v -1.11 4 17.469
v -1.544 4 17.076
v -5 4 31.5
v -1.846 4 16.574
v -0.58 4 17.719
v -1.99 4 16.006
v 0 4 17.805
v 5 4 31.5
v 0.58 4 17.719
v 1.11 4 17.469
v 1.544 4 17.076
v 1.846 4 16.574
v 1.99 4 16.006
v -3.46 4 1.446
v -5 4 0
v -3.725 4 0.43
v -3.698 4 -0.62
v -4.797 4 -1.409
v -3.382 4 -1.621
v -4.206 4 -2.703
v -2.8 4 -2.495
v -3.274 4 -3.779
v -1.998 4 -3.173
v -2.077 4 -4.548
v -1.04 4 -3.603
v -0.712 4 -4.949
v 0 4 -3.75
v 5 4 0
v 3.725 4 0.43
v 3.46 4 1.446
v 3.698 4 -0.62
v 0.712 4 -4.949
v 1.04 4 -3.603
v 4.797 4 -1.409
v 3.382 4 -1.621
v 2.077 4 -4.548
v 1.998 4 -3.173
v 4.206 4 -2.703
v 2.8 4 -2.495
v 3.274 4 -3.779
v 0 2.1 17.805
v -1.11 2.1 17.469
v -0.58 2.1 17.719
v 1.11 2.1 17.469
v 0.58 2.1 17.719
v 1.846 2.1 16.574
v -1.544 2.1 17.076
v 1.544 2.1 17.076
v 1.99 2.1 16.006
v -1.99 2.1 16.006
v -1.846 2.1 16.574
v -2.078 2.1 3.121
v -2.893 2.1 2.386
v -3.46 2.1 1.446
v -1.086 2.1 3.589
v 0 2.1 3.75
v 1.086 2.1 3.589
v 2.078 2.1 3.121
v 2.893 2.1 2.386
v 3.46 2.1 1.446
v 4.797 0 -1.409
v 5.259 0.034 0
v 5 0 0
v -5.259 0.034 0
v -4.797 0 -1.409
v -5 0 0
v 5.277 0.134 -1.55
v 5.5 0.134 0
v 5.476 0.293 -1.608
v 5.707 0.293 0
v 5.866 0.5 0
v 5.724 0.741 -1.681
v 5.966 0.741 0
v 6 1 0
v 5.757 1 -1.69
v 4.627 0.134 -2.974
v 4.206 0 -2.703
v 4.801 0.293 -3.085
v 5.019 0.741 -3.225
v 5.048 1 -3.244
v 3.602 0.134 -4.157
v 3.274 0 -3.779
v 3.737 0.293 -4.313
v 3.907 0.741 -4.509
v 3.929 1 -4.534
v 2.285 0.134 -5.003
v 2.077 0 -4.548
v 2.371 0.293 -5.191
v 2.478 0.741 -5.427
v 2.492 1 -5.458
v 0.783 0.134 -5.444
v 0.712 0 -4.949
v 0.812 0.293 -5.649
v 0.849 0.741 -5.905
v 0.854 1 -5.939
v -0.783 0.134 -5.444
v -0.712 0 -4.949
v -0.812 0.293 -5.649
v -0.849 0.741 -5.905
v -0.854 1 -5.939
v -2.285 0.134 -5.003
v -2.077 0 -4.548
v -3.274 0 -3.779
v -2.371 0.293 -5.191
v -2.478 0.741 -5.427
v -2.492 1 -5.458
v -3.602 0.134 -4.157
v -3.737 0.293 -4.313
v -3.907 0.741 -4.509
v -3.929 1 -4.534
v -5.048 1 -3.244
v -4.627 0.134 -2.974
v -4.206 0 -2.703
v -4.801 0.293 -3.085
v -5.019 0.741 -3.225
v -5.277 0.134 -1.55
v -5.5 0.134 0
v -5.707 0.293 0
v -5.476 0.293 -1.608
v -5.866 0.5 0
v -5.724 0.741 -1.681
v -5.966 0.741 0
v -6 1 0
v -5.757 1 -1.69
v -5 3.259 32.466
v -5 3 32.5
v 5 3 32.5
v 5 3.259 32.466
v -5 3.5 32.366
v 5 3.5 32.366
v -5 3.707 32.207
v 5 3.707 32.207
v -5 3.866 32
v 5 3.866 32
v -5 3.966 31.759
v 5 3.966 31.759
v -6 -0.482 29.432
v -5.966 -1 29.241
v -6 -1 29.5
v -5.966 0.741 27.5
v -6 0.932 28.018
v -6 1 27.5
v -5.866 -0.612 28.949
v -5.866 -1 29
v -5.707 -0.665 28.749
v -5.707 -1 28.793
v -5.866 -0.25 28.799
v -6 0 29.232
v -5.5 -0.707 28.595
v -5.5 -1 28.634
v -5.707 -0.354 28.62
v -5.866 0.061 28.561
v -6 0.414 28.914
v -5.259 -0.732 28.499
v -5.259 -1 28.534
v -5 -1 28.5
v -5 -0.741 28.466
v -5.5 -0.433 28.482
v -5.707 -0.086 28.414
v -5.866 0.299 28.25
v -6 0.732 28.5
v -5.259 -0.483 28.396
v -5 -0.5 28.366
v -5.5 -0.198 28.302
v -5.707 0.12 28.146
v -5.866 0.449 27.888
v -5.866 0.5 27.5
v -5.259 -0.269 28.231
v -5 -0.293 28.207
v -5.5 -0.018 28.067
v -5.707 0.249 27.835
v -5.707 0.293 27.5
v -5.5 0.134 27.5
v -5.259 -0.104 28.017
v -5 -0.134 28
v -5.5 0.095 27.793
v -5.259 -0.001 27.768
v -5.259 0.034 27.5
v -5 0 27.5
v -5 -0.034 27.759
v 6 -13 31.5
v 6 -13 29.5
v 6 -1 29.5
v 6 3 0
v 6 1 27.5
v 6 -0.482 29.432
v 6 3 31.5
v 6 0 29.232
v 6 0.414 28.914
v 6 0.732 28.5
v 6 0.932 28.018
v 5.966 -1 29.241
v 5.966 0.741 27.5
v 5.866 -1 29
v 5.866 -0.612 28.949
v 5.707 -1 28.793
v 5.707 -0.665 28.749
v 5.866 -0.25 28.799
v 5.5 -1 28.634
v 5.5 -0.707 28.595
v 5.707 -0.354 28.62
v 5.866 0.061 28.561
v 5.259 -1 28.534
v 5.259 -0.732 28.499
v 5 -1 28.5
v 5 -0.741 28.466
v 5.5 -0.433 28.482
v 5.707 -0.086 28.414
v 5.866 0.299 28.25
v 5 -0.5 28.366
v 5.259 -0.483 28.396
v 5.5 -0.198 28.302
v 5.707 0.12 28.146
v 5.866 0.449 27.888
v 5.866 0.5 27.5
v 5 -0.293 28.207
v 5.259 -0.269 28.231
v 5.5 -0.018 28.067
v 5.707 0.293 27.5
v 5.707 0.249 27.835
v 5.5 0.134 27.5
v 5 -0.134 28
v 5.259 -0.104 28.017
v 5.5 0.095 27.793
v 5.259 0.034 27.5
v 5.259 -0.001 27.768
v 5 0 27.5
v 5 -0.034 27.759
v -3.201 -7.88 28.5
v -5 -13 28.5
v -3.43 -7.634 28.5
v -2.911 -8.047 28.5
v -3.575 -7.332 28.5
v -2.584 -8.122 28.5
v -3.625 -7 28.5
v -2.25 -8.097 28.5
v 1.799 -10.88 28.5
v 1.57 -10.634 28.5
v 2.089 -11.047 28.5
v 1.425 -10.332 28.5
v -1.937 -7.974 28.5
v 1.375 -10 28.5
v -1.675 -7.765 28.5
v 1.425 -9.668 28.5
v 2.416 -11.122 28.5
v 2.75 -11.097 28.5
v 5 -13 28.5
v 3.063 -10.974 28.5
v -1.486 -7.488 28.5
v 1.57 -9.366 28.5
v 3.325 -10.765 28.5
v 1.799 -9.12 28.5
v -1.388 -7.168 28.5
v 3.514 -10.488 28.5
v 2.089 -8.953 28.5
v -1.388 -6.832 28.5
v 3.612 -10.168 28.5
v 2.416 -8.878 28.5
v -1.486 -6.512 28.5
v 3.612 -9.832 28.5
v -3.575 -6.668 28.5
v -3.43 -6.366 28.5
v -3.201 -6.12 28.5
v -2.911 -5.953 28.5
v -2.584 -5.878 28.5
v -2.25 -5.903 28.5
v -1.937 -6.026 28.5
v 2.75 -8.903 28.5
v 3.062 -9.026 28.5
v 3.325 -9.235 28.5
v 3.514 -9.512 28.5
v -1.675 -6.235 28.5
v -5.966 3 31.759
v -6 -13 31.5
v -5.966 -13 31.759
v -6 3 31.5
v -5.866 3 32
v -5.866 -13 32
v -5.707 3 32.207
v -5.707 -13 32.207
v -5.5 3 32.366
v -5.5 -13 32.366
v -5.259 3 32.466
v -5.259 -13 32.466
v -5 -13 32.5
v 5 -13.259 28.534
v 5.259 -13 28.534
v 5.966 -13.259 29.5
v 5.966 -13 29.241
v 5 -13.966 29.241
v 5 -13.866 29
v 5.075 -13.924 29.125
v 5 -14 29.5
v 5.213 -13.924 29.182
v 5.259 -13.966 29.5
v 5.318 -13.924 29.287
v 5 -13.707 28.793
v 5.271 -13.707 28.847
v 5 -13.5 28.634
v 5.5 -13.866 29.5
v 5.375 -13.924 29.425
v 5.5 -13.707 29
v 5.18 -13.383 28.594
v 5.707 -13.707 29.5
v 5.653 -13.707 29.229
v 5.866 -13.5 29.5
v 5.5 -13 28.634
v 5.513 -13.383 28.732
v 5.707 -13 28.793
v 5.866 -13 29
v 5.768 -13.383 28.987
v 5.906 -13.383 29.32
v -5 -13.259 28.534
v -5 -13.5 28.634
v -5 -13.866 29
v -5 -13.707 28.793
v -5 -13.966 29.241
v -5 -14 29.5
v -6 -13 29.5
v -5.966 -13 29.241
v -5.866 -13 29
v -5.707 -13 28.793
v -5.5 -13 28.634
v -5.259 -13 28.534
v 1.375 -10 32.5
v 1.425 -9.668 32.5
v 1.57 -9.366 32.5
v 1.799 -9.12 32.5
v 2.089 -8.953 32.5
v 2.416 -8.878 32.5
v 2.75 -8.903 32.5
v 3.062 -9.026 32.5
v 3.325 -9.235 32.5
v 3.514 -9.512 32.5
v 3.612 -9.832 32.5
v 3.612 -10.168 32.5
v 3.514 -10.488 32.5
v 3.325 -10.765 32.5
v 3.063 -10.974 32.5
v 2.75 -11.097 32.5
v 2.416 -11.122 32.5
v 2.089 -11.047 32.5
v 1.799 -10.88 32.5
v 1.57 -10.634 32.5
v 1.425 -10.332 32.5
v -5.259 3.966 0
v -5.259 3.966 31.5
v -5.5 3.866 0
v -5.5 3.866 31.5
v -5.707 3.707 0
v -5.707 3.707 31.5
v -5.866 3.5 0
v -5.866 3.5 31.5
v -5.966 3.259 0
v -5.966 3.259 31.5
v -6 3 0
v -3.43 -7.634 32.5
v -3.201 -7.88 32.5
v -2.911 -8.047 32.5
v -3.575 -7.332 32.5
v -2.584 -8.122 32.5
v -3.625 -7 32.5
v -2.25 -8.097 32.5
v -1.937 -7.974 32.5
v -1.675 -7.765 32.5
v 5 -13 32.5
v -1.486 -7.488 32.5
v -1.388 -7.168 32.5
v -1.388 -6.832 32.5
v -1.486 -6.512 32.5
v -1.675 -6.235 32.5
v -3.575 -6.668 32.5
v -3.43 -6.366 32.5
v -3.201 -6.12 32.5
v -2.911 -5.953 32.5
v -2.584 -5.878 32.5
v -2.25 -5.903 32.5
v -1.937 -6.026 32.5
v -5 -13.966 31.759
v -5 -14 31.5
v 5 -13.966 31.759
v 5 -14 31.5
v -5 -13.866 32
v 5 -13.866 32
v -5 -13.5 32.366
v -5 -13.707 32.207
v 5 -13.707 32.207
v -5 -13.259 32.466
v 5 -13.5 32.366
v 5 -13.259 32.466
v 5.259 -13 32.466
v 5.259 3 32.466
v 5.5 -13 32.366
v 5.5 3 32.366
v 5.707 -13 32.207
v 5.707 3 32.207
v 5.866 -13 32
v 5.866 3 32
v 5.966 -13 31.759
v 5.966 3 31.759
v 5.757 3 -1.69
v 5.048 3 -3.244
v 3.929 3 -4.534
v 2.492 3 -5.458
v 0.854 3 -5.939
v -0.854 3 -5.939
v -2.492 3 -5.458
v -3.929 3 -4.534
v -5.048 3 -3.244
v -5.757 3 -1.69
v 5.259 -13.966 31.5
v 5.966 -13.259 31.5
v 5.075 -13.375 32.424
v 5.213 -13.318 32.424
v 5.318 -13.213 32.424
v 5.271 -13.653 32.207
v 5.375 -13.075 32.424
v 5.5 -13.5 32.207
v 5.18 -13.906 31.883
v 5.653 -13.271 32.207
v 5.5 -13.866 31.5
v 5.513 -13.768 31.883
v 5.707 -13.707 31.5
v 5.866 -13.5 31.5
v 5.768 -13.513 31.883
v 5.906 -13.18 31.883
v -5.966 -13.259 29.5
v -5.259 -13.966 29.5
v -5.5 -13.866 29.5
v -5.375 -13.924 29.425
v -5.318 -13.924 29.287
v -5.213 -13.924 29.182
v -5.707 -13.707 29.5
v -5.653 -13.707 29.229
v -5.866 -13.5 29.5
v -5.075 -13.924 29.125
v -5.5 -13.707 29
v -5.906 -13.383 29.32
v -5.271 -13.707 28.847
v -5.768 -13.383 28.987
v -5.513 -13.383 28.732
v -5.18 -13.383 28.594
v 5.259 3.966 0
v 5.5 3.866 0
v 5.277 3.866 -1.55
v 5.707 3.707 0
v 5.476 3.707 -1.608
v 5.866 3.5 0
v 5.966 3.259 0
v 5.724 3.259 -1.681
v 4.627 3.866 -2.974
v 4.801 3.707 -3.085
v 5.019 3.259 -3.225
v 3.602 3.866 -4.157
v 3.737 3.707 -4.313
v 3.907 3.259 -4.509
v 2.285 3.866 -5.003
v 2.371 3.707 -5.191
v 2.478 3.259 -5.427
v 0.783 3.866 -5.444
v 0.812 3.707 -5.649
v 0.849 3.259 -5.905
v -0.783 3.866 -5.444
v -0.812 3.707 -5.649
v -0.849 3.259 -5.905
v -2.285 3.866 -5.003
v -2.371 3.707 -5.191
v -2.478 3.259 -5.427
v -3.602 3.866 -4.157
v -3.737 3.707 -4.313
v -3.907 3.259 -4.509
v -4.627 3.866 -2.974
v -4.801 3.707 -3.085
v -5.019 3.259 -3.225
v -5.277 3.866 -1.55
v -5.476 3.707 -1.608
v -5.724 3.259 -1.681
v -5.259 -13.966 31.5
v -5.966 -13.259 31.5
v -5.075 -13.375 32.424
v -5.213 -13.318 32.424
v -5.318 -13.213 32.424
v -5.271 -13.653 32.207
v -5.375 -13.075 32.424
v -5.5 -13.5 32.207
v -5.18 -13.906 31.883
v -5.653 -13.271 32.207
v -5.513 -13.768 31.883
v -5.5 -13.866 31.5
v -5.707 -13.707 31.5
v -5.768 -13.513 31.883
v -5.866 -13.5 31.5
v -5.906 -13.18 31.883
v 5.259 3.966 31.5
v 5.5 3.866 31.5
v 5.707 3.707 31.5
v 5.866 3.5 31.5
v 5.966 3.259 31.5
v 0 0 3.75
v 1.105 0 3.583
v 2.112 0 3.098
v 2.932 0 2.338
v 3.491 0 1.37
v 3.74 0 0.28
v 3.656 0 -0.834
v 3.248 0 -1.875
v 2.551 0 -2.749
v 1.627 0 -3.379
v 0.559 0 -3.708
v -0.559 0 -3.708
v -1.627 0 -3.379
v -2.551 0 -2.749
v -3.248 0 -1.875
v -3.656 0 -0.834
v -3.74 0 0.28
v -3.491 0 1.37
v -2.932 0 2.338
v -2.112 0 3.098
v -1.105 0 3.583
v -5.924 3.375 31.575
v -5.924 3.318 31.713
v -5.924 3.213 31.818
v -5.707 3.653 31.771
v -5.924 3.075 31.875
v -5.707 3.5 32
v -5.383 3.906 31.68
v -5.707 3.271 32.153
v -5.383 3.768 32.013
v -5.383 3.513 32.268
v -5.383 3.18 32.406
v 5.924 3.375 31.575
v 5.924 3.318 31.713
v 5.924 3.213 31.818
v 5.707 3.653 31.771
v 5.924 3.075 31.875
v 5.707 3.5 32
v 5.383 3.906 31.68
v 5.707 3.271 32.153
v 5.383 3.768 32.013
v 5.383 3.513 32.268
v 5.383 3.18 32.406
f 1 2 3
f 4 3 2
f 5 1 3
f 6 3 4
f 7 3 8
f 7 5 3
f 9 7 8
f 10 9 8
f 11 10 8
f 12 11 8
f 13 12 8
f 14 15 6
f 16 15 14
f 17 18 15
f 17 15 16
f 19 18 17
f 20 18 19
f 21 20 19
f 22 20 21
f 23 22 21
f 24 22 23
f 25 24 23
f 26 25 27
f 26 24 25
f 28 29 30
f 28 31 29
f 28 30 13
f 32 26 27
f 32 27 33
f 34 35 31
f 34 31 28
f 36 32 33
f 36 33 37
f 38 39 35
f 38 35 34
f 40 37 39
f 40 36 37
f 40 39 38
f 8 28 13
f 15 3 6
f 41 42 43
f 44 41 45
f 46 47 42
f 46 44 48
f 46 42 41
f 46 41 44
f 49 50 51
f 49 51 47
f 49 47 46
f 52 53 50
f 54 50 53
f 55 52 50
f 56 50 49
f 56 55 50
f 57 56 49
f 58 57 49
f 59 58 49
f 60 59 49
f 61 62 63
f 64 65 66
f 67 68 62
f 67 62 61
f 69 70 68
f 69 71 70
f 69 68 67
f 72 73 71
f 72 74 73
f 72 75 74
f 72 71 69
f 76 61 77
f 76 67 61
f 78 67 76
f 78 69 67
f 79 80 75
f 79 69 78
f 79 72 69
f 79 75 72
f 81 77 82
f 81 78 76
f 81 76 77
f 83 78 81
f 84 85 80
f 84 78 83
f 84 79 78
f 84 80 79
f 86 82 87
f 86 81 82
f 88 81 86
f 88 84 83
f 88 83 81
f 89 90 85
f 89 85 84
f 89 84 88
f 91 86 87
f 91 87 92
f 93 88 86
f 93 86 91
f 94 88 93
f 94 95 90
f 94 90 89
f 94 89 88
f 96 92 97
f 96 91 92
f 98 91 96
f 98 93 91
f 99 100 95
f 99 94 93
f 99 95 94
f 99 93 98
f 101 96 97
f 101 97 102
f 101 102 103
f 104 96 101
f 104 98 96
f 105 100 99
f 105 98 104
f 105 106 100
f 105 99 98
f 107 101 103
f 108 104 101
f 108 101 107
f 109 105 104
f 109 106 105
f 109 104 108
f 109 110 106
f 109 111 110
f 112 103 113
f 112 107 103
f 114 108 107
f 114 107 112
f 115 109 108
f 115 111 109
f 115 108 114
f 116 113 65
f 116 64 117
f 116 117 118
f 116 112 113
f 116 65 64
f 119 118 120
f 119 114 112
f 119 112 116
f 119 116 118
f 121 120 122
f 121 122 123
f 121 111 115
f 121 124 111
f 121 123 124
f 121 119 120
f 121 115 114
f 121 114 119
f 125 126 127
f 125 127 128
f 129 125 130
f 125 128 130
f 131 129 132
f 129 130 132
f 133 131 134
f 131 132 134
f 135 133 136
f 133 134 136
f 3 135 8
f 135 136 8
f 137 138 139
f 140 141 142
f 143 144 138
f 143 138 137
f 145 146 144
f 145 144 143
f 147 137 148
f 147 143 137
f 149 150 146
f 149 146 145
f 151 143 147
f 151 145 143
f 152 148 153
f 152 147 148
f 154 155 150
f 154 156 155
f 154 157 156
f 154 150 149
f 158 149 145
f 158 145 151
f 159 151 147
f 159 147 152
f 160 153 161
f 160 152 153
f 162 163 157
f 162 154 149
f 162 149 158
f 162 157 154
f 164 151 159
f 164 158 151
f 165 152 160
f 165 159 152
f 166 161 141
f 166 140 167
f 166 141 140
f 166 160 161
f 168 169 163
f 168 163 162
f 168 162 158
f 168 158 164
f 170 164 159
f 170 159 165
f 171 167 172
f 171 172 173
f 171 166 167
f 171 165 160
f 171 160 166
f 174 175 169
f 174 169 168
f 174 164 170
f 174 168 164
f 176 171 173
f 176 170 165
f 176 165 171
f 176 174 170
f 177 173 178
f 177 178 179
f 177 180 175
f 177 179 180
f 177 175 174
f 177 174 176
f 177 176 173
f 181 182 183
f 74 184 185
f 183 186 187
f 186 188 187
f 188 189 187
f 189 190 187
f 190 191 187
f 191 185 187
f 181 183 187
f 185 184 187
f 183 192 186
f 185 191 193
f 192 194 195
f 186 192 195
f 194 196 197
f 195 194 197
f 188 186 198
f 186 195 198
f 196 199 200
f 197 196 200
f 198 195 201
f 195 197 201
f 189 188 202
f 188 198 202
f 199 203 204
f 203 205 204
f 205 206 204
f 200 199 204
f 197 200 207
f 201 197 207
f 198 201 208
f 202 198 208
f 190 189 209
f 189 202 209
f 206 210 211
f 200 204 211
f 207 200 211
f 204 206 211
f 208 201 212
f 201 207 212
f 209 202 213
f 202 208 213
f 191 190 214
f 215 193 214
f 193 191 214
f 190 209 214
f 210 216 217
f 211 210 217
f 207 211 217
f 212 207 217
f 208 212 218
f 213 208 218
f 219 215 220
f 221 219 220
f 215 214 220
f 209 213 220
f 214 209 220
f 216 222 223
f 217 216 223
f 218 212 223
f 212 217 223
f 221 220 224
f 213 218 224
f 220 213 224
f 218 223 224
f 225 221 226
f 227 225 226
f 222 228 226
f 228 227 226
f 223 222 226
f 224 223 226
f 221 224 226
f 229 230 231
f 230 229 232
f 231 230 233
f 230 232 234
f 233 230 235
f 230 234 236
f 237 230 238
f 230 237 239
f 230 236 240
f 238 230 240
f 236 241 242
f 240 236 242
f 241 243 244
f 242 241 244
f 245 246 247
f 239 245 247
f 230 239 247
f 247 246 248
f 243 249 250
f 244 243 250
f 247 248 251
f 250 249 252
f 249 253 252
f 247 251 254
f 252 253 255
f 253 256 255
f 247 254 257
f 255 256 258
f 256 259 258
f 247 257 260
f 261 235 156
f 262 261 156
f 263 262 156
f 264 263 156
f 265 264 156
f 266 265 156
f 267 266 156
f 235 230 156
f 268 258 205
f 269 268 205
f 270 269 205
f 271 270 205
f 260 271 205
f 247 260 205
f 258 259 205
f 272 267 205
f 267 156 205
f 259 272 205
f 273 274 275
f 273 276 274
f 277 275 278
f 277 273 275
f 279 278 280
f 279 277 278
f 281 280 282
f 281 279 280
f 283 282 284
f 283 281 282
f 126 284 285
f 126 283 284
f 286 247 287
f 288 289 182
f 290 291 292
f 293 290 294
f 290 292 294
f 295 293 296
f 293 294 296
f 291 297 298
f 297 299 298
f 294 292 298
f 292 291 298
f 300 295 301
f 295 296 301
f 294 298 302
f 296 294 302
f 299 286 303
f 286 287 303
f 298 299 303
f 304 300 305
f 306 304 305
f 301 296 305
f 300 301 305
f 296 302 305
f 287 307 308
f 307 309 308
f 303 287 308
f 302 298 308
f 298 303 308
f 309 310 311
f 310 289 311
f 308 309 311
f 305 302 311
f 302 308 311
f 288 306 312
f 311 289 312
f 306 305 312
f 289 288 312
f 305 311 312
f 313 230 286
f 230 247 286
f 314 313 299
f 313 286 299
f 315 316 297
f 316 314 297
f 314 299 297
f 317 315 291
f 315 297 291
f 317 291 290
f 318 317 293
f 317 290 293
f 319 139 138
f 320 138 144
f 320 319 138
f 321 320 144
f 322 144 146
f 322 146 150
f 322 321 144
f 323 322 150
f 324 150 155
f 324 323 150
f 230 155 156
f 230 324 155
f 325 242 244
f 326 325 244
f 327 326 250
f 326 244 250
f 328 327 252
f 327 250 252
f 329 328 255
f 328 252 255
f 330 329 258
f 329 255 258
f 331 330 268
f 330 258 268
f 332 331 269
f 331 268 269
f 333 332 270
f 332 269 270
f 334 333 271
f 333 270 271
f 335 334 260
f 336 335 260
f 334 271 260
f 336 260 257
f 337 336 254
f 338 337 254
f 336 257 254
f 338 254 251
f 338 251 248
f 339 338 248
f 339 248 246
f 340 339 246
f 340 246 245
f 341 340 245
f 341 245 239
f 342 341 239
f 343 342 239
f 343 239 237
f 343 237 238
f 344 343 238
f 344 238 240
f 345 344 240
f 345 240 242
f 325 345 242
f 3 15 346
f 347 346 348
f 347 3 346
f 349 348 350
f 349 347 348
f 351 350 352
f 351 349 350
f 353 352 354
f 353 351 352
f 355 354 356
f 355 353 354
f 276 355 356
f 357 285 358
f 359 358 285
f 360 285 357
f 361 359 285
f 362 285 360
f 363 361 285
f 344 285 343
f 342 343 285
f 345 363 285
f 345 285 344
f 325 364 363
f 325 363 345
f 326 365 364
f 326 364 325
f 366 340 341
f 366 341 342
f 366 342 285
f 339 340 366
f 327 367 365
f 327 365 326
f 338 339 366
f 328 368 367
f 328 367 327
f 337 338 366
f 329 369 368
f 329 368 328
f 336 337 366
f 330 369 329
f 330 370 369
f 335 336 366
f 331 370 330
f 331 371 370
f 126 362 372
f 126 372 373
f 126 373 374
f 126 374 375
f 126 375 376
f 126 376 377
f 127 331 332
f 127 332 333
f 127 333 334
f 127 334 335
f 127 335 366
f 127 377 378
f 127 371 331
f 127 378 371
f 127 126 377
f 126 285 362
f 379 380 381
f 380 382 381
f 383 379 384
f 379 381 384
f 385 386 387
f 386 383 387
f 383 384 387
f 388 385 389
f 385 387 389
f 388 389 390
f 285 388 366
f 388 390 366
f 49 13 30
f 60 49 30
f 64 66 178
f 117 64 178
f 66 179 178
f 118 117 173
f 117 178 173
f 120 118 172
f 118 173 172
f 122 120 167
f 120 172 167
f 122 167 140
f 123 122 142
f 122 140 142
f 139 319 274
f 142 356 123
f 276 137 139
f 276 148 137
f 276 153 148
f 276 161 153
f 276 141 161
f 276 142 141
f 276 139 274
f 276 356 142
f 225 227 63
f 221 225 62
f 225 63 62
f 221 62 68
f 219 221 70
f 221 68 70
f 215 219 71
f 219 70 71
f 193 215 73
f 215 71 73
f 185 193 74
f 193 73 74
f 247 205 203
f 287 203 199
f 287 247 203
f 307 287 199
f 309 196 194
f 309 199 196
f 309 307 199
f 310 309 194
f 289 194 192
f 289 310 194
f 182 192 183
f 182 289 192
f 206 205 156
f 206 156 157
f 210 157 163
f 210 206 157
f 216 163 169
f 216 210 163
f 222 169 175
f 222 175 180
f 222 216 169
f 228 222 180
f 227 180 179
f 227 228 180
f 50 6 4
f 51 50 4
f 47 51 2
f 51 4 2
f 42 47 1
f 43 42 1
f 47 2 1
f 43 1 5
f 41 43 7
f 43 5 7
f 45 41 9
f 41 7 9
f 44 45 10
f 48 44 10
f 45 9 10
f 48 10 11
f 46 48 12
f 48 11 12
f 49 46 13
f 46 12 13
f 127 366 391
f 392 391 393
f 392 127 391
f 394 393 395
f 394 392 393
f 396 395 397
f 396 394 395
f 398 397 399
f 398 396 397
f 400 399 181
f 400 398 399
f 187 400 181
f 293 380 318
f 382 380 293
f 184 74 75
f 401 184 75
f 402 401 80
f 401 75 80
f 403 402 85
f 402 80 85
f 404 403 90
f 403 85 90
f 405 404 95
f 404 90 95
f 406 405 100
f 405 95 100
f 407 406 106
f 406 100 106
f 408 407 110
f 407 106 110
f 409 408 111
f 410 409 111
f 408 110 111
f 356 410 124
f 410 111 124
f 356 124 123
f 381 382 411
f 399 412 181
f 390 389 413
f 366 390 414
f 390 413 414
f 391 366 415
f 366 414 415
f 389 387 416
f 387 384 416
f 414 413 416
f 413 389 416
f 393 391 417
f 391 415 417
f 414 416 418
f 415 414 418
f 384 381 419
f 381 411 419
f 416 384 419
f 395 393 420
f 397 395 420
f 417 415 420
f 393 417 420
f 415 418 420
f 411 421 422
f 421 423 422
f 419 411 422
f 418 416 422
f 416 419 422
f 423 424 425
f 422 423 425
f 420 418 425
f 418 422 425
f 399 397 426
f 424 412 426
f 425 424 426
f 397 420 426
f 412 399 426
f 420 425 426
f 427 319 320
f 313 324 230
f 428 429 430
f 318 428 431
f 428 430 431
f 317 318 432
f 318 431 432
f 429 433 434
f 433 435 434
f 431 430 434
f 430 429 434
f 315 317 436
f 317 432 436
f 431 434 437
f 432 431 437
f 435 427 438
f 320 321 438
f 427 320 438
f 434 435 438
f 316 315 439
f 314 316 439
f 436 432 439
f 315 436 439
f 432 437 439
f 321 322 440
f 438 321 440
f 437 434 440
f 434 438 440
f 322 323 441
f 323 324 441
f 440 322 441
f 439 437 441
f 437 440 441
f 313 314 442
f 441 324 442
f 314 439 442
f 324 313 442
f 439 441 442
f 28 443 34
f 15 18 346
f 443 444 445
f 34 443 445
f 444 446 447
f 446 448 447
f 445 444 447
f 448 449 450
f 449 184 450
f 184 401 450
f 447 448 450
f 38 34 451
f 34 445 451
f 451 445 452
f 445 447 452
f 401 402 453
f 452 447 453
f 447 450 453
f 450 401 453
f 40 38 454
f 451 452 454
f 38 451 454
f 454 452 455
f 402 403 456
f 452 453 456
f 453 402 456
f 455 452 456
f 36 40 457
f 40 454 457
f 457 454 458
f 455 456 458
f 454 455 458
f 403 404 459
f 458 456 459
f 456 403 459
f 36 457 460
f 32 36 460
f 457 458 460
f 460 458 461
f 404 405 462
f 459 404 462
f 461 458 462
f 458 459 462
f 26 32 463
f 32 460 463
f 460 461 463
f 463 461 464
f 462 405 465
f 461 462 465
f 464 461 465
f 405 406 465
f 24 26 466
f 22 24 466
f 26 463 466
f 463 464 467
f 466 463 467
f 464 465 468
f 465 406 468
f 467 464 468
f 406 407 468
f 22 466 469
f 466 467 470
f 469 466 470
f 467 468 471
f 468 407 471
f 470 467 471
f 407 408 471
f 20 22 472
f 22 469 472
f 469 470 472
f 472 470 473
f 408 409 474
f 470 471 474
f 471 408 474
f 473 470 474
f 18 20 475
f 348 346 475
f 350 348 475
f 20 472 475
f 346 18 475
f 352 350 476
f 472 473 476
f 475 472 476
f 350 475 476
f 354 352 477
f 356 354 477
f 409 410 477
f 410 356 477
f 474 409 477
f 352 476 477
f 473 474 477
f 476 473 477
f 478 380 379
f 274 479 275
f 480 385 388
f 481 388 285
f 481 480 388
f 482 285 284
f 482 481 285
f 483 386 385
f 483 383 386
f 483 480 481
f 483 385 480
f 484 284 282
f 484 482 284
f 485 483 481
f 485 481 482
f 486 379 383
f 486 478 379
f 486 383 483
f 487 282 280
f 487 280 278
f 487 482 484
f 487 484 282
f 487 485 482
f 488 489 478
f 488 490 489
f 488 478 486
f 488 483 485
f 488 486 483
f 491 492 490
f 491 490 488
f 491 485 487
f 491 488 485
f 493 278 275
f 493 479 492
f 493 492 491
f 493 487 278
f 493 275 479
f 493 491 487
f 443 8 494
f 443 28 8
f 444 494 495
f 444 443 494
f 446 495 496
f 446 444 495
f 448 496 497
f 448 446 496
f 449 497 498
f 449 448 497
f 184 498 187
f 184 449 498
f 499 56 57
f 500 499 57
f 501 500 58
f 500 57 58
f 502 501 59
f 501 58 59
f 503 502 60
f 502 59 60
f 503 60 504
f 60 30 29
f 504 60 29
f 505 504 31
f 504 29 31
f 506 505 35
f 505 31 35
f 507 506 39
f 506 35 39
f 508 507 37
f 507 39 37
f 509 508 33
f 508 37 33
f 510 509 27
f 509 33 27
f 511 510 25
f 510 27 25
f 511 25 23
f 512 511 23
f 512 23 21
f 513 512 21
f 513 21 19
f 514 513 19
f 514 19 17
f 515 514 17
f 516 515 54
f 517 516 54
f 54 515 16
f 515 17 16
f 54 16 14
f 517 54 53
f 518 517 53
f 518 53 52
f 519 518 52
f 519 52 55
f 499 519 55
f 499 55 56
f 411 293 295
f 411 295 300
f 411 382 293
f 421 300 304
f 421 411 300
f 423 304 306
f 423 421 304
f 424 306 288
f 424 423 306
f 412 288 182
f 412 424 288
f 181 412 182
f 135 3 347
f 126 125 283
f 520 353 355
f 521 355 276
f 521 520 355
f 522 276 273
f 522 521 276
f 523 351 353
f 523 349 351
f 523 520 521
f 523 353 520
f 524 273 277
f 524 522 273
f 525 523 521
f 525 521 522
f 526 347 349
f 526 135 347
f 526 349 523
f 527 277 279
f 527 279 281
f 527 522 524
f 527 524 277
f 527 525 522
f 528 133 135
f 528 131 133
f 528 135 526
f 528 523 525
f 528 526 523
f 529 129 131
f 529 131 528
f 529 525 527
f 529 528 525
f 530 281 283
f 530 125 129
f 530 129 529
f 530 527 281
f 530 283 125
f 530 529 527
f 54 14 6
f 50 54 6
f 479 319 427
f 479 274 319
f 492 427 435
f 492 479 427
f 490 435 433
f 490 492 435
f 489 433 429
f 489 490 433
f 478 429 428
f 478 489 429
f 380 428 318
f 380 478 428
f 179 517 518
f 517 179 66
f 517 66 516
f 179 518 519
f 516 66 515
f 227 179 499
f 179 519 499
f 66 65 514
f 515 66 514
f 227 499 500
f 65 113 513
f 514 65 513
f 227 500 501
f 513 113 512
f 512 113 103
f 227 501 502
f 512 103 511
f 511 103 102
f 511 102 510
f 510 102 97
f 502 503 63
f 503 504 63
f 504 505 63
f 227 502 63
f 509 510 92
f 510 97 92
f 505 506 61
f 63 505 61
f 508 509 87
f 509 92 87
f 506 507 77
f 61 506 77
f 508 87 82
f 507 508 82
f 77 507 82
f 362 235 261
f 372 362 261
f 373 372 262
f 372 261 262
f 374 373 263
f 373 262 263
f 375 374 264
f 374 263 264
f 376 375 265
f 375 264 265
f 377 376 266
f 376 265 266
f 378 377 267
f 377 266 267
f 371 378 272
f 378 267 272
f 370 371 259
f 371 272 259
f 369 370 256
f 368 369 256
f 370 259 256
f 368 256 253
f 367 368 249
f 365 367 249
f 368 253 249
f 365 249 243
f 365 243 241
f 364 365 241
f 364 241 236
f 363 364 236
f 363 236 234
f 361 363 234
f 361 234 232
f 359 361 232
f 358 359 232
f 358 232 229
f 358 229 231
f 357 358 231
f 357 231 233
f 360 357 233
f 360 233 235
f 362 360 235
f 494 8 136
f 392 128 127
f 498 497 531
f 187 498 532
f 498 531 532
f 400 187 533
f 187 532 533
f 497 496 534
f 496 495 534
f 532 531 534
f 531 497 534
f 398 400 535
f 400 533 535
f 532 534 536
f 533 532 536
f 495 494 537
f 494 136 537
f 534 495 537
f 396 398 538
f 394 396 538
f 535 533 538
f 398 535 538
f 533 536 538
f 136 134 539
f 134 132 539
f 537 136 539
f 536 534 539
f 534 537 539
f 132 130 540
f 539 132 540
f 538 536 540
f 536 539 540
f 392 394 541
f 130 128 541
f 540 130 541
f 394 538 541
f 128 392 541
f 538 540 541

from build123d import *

# Parameters (mm, degrees)
YAW_ARM_BASE_DEPTH           = 4
YAW_ARM_MOUNTING_HOLE_REACH  = 35.29
SKETCH2_R                    = 3.75
YAW_ARM_SLOT_DEPTH           = 1.9
SKETCH5_W                    = 12
SKETCH5_H                    = 4
MOUNTING_BRACKET_DEPTH       = 14
BRACKET_MOUNTING_HOLES_REACH = 39.713
SKETCH8_R                    = 1.125
F_1MM_FILLETS_R              = 1


with BuildPart() as part:
    # Sketch1 → Yaw Arm Base (new body)
    with BuildSketch(Plane(origin=(0, 0, 0), x_dir=(1, 0, 0), z_dir=(0, 1, 0))):
        with BuildLine():
            Line((-6, 0), (-6, -32.5))
            Line((-6, -32.5), (6, -32.5))
            Line((6, -32.5), (6, 0))
            ThreePointArc((6, 0), (0, 6), (-6, 0))
        make_face()
    extrude(amount=YAW_ARM_BASE_DEPTH)

    # Sketch2 → Yaw Arm Mounting Hole (cut, up to next)
    with BuildSketch(Plane(origin=(0, 4, 0), x_dir=(1, 0, 0), z_dir=(0, 1, 0)), mode=Mode.PRIVATE) as yaw_arm_mounting_hole_sk1:
        with Locations(Location((0, 0, 0), (0, 0, 270))):
            Circle(SKETCH2_R)
    yaw_arm_mounting_hole_tool1 = extrude(yaw_arm_mounting_hole_sk1.sketch, amount=-YAW_ARM_MOUNTING_HOLE_REACH, mode=Mode.PRIVATE) & part.part
    add(yaw_arm_mounting_hole_tool1.solids().sort_by_distance((0, 4, 0))[0], mode=Mode.SUBTRACT)

    # Sketch4 → Yaw Arm Slot (cut)
    with BuildSketch(Plane(origin=(0, 4, 0), x_dir=(1, 0, 0), z_dir=(0, 1, 0))):
        with BuildLine():
            Line((-3.46, -1.445994467), (-1.989882432, -16.005994467))
            ThreePointArc((-1.989882432, -16.005994467), (0, -17.805076808), (1.989882432, -16.005994467))
            Line((1.989882432, -16.005994467), (3.46, -1.445994467))
            ThreePointArc((3.46, -1.445994467), (0, -3.75), (-3.46, -1.445994467))
        make_face()
    extrude(amount=-YAW_ARM_SLOT_DEPTH, mode=Mode.SUBTRACT)

    # Sketch5 → Mounting Bracket (add)
    with BuildSketch(Plane.XZ):
        with Locations((0, 30.5)):
            Rectangle(SKETCH5_W, SKETCH5_H)
    extrude(amount=MOUNTING_BRACKET_DEPTH)

    # Sketch8 → Bracket Mounting Holes (cut, up to next)
    with BuildSketch(Plane(origin=(0, 0, 28.5), x_dir=(-1, 0, 0), z_dir=(0, 0, -1)), mode=Mode.PRIVATE) as bracket_mounting_holes_sk1:
        with Locations((-2.5, -10)):
            Circle(SKETCH8_R)
    bracket_mounting_holes_tool1 = extrude(bracket_mounting_holes_sk1.sketch, amount=-BRACKET_MOUNTING_HOLES_REACH, mode=Mode.PRIVATE) & part.part
    # Sketch8 → Bracket Mounting Holes (cut, up to next)
    with BuildSketch(Plane(origin=(0, 0, 28.5), x_dir=(-1, 0, 0), z_dir=(0, 0, -1)), mode=Mode.PRIVATE) as bracket_mounting_holes_sk2:
        with Locations((2.5, -7)):
            Circle(SKETCH8_R)
    bracket_mounting_holes_tool2 = extrude(bracket_mounting_holes_sk2.sketch, amount=-BRACKET_MOUNTING_HOLES_REACH, mode=Mode.PRIVATE) & part.part
    add(bracket_mounting_holes_tool1.solids().sort_by_distance((2.5, -10, 28.5))[0], mode=Mode.SUBTRACT)
    add(bracket_mounting_holes_tool2.solids().sort_by_distance((-2.5, -7, 28.5))[0], mode=Mode.SUBTRACT)

    # 1mm Fillets
    f_1mm_fillets_edges = [part.edges().sort_by_distance(p)[0] for p in [
        (0, 4, 32.5),
        (6, 4, 16.25),
        (6, 0, 14.25),
        (0, 0, 28.5),
        (-6, -7, 28.5),
        (6, -7, 28.5),
        (-6, -14, 30.5),
        (0, -14, 28.5),
        (6, -14, 30.5),
        (0, -14, 32.5),
        (0, 4, -6),
        (-6, 0, 14.25),
        (0, 0, -6),
        (6, -5, 32.5),
        (-6, -5, 32.5),
        (-6, 4, 16.25),
    ]]
    fillet(f_1mm_fillets_edges, radius=F_1MM_FILLETS_R)


solid = part.part
